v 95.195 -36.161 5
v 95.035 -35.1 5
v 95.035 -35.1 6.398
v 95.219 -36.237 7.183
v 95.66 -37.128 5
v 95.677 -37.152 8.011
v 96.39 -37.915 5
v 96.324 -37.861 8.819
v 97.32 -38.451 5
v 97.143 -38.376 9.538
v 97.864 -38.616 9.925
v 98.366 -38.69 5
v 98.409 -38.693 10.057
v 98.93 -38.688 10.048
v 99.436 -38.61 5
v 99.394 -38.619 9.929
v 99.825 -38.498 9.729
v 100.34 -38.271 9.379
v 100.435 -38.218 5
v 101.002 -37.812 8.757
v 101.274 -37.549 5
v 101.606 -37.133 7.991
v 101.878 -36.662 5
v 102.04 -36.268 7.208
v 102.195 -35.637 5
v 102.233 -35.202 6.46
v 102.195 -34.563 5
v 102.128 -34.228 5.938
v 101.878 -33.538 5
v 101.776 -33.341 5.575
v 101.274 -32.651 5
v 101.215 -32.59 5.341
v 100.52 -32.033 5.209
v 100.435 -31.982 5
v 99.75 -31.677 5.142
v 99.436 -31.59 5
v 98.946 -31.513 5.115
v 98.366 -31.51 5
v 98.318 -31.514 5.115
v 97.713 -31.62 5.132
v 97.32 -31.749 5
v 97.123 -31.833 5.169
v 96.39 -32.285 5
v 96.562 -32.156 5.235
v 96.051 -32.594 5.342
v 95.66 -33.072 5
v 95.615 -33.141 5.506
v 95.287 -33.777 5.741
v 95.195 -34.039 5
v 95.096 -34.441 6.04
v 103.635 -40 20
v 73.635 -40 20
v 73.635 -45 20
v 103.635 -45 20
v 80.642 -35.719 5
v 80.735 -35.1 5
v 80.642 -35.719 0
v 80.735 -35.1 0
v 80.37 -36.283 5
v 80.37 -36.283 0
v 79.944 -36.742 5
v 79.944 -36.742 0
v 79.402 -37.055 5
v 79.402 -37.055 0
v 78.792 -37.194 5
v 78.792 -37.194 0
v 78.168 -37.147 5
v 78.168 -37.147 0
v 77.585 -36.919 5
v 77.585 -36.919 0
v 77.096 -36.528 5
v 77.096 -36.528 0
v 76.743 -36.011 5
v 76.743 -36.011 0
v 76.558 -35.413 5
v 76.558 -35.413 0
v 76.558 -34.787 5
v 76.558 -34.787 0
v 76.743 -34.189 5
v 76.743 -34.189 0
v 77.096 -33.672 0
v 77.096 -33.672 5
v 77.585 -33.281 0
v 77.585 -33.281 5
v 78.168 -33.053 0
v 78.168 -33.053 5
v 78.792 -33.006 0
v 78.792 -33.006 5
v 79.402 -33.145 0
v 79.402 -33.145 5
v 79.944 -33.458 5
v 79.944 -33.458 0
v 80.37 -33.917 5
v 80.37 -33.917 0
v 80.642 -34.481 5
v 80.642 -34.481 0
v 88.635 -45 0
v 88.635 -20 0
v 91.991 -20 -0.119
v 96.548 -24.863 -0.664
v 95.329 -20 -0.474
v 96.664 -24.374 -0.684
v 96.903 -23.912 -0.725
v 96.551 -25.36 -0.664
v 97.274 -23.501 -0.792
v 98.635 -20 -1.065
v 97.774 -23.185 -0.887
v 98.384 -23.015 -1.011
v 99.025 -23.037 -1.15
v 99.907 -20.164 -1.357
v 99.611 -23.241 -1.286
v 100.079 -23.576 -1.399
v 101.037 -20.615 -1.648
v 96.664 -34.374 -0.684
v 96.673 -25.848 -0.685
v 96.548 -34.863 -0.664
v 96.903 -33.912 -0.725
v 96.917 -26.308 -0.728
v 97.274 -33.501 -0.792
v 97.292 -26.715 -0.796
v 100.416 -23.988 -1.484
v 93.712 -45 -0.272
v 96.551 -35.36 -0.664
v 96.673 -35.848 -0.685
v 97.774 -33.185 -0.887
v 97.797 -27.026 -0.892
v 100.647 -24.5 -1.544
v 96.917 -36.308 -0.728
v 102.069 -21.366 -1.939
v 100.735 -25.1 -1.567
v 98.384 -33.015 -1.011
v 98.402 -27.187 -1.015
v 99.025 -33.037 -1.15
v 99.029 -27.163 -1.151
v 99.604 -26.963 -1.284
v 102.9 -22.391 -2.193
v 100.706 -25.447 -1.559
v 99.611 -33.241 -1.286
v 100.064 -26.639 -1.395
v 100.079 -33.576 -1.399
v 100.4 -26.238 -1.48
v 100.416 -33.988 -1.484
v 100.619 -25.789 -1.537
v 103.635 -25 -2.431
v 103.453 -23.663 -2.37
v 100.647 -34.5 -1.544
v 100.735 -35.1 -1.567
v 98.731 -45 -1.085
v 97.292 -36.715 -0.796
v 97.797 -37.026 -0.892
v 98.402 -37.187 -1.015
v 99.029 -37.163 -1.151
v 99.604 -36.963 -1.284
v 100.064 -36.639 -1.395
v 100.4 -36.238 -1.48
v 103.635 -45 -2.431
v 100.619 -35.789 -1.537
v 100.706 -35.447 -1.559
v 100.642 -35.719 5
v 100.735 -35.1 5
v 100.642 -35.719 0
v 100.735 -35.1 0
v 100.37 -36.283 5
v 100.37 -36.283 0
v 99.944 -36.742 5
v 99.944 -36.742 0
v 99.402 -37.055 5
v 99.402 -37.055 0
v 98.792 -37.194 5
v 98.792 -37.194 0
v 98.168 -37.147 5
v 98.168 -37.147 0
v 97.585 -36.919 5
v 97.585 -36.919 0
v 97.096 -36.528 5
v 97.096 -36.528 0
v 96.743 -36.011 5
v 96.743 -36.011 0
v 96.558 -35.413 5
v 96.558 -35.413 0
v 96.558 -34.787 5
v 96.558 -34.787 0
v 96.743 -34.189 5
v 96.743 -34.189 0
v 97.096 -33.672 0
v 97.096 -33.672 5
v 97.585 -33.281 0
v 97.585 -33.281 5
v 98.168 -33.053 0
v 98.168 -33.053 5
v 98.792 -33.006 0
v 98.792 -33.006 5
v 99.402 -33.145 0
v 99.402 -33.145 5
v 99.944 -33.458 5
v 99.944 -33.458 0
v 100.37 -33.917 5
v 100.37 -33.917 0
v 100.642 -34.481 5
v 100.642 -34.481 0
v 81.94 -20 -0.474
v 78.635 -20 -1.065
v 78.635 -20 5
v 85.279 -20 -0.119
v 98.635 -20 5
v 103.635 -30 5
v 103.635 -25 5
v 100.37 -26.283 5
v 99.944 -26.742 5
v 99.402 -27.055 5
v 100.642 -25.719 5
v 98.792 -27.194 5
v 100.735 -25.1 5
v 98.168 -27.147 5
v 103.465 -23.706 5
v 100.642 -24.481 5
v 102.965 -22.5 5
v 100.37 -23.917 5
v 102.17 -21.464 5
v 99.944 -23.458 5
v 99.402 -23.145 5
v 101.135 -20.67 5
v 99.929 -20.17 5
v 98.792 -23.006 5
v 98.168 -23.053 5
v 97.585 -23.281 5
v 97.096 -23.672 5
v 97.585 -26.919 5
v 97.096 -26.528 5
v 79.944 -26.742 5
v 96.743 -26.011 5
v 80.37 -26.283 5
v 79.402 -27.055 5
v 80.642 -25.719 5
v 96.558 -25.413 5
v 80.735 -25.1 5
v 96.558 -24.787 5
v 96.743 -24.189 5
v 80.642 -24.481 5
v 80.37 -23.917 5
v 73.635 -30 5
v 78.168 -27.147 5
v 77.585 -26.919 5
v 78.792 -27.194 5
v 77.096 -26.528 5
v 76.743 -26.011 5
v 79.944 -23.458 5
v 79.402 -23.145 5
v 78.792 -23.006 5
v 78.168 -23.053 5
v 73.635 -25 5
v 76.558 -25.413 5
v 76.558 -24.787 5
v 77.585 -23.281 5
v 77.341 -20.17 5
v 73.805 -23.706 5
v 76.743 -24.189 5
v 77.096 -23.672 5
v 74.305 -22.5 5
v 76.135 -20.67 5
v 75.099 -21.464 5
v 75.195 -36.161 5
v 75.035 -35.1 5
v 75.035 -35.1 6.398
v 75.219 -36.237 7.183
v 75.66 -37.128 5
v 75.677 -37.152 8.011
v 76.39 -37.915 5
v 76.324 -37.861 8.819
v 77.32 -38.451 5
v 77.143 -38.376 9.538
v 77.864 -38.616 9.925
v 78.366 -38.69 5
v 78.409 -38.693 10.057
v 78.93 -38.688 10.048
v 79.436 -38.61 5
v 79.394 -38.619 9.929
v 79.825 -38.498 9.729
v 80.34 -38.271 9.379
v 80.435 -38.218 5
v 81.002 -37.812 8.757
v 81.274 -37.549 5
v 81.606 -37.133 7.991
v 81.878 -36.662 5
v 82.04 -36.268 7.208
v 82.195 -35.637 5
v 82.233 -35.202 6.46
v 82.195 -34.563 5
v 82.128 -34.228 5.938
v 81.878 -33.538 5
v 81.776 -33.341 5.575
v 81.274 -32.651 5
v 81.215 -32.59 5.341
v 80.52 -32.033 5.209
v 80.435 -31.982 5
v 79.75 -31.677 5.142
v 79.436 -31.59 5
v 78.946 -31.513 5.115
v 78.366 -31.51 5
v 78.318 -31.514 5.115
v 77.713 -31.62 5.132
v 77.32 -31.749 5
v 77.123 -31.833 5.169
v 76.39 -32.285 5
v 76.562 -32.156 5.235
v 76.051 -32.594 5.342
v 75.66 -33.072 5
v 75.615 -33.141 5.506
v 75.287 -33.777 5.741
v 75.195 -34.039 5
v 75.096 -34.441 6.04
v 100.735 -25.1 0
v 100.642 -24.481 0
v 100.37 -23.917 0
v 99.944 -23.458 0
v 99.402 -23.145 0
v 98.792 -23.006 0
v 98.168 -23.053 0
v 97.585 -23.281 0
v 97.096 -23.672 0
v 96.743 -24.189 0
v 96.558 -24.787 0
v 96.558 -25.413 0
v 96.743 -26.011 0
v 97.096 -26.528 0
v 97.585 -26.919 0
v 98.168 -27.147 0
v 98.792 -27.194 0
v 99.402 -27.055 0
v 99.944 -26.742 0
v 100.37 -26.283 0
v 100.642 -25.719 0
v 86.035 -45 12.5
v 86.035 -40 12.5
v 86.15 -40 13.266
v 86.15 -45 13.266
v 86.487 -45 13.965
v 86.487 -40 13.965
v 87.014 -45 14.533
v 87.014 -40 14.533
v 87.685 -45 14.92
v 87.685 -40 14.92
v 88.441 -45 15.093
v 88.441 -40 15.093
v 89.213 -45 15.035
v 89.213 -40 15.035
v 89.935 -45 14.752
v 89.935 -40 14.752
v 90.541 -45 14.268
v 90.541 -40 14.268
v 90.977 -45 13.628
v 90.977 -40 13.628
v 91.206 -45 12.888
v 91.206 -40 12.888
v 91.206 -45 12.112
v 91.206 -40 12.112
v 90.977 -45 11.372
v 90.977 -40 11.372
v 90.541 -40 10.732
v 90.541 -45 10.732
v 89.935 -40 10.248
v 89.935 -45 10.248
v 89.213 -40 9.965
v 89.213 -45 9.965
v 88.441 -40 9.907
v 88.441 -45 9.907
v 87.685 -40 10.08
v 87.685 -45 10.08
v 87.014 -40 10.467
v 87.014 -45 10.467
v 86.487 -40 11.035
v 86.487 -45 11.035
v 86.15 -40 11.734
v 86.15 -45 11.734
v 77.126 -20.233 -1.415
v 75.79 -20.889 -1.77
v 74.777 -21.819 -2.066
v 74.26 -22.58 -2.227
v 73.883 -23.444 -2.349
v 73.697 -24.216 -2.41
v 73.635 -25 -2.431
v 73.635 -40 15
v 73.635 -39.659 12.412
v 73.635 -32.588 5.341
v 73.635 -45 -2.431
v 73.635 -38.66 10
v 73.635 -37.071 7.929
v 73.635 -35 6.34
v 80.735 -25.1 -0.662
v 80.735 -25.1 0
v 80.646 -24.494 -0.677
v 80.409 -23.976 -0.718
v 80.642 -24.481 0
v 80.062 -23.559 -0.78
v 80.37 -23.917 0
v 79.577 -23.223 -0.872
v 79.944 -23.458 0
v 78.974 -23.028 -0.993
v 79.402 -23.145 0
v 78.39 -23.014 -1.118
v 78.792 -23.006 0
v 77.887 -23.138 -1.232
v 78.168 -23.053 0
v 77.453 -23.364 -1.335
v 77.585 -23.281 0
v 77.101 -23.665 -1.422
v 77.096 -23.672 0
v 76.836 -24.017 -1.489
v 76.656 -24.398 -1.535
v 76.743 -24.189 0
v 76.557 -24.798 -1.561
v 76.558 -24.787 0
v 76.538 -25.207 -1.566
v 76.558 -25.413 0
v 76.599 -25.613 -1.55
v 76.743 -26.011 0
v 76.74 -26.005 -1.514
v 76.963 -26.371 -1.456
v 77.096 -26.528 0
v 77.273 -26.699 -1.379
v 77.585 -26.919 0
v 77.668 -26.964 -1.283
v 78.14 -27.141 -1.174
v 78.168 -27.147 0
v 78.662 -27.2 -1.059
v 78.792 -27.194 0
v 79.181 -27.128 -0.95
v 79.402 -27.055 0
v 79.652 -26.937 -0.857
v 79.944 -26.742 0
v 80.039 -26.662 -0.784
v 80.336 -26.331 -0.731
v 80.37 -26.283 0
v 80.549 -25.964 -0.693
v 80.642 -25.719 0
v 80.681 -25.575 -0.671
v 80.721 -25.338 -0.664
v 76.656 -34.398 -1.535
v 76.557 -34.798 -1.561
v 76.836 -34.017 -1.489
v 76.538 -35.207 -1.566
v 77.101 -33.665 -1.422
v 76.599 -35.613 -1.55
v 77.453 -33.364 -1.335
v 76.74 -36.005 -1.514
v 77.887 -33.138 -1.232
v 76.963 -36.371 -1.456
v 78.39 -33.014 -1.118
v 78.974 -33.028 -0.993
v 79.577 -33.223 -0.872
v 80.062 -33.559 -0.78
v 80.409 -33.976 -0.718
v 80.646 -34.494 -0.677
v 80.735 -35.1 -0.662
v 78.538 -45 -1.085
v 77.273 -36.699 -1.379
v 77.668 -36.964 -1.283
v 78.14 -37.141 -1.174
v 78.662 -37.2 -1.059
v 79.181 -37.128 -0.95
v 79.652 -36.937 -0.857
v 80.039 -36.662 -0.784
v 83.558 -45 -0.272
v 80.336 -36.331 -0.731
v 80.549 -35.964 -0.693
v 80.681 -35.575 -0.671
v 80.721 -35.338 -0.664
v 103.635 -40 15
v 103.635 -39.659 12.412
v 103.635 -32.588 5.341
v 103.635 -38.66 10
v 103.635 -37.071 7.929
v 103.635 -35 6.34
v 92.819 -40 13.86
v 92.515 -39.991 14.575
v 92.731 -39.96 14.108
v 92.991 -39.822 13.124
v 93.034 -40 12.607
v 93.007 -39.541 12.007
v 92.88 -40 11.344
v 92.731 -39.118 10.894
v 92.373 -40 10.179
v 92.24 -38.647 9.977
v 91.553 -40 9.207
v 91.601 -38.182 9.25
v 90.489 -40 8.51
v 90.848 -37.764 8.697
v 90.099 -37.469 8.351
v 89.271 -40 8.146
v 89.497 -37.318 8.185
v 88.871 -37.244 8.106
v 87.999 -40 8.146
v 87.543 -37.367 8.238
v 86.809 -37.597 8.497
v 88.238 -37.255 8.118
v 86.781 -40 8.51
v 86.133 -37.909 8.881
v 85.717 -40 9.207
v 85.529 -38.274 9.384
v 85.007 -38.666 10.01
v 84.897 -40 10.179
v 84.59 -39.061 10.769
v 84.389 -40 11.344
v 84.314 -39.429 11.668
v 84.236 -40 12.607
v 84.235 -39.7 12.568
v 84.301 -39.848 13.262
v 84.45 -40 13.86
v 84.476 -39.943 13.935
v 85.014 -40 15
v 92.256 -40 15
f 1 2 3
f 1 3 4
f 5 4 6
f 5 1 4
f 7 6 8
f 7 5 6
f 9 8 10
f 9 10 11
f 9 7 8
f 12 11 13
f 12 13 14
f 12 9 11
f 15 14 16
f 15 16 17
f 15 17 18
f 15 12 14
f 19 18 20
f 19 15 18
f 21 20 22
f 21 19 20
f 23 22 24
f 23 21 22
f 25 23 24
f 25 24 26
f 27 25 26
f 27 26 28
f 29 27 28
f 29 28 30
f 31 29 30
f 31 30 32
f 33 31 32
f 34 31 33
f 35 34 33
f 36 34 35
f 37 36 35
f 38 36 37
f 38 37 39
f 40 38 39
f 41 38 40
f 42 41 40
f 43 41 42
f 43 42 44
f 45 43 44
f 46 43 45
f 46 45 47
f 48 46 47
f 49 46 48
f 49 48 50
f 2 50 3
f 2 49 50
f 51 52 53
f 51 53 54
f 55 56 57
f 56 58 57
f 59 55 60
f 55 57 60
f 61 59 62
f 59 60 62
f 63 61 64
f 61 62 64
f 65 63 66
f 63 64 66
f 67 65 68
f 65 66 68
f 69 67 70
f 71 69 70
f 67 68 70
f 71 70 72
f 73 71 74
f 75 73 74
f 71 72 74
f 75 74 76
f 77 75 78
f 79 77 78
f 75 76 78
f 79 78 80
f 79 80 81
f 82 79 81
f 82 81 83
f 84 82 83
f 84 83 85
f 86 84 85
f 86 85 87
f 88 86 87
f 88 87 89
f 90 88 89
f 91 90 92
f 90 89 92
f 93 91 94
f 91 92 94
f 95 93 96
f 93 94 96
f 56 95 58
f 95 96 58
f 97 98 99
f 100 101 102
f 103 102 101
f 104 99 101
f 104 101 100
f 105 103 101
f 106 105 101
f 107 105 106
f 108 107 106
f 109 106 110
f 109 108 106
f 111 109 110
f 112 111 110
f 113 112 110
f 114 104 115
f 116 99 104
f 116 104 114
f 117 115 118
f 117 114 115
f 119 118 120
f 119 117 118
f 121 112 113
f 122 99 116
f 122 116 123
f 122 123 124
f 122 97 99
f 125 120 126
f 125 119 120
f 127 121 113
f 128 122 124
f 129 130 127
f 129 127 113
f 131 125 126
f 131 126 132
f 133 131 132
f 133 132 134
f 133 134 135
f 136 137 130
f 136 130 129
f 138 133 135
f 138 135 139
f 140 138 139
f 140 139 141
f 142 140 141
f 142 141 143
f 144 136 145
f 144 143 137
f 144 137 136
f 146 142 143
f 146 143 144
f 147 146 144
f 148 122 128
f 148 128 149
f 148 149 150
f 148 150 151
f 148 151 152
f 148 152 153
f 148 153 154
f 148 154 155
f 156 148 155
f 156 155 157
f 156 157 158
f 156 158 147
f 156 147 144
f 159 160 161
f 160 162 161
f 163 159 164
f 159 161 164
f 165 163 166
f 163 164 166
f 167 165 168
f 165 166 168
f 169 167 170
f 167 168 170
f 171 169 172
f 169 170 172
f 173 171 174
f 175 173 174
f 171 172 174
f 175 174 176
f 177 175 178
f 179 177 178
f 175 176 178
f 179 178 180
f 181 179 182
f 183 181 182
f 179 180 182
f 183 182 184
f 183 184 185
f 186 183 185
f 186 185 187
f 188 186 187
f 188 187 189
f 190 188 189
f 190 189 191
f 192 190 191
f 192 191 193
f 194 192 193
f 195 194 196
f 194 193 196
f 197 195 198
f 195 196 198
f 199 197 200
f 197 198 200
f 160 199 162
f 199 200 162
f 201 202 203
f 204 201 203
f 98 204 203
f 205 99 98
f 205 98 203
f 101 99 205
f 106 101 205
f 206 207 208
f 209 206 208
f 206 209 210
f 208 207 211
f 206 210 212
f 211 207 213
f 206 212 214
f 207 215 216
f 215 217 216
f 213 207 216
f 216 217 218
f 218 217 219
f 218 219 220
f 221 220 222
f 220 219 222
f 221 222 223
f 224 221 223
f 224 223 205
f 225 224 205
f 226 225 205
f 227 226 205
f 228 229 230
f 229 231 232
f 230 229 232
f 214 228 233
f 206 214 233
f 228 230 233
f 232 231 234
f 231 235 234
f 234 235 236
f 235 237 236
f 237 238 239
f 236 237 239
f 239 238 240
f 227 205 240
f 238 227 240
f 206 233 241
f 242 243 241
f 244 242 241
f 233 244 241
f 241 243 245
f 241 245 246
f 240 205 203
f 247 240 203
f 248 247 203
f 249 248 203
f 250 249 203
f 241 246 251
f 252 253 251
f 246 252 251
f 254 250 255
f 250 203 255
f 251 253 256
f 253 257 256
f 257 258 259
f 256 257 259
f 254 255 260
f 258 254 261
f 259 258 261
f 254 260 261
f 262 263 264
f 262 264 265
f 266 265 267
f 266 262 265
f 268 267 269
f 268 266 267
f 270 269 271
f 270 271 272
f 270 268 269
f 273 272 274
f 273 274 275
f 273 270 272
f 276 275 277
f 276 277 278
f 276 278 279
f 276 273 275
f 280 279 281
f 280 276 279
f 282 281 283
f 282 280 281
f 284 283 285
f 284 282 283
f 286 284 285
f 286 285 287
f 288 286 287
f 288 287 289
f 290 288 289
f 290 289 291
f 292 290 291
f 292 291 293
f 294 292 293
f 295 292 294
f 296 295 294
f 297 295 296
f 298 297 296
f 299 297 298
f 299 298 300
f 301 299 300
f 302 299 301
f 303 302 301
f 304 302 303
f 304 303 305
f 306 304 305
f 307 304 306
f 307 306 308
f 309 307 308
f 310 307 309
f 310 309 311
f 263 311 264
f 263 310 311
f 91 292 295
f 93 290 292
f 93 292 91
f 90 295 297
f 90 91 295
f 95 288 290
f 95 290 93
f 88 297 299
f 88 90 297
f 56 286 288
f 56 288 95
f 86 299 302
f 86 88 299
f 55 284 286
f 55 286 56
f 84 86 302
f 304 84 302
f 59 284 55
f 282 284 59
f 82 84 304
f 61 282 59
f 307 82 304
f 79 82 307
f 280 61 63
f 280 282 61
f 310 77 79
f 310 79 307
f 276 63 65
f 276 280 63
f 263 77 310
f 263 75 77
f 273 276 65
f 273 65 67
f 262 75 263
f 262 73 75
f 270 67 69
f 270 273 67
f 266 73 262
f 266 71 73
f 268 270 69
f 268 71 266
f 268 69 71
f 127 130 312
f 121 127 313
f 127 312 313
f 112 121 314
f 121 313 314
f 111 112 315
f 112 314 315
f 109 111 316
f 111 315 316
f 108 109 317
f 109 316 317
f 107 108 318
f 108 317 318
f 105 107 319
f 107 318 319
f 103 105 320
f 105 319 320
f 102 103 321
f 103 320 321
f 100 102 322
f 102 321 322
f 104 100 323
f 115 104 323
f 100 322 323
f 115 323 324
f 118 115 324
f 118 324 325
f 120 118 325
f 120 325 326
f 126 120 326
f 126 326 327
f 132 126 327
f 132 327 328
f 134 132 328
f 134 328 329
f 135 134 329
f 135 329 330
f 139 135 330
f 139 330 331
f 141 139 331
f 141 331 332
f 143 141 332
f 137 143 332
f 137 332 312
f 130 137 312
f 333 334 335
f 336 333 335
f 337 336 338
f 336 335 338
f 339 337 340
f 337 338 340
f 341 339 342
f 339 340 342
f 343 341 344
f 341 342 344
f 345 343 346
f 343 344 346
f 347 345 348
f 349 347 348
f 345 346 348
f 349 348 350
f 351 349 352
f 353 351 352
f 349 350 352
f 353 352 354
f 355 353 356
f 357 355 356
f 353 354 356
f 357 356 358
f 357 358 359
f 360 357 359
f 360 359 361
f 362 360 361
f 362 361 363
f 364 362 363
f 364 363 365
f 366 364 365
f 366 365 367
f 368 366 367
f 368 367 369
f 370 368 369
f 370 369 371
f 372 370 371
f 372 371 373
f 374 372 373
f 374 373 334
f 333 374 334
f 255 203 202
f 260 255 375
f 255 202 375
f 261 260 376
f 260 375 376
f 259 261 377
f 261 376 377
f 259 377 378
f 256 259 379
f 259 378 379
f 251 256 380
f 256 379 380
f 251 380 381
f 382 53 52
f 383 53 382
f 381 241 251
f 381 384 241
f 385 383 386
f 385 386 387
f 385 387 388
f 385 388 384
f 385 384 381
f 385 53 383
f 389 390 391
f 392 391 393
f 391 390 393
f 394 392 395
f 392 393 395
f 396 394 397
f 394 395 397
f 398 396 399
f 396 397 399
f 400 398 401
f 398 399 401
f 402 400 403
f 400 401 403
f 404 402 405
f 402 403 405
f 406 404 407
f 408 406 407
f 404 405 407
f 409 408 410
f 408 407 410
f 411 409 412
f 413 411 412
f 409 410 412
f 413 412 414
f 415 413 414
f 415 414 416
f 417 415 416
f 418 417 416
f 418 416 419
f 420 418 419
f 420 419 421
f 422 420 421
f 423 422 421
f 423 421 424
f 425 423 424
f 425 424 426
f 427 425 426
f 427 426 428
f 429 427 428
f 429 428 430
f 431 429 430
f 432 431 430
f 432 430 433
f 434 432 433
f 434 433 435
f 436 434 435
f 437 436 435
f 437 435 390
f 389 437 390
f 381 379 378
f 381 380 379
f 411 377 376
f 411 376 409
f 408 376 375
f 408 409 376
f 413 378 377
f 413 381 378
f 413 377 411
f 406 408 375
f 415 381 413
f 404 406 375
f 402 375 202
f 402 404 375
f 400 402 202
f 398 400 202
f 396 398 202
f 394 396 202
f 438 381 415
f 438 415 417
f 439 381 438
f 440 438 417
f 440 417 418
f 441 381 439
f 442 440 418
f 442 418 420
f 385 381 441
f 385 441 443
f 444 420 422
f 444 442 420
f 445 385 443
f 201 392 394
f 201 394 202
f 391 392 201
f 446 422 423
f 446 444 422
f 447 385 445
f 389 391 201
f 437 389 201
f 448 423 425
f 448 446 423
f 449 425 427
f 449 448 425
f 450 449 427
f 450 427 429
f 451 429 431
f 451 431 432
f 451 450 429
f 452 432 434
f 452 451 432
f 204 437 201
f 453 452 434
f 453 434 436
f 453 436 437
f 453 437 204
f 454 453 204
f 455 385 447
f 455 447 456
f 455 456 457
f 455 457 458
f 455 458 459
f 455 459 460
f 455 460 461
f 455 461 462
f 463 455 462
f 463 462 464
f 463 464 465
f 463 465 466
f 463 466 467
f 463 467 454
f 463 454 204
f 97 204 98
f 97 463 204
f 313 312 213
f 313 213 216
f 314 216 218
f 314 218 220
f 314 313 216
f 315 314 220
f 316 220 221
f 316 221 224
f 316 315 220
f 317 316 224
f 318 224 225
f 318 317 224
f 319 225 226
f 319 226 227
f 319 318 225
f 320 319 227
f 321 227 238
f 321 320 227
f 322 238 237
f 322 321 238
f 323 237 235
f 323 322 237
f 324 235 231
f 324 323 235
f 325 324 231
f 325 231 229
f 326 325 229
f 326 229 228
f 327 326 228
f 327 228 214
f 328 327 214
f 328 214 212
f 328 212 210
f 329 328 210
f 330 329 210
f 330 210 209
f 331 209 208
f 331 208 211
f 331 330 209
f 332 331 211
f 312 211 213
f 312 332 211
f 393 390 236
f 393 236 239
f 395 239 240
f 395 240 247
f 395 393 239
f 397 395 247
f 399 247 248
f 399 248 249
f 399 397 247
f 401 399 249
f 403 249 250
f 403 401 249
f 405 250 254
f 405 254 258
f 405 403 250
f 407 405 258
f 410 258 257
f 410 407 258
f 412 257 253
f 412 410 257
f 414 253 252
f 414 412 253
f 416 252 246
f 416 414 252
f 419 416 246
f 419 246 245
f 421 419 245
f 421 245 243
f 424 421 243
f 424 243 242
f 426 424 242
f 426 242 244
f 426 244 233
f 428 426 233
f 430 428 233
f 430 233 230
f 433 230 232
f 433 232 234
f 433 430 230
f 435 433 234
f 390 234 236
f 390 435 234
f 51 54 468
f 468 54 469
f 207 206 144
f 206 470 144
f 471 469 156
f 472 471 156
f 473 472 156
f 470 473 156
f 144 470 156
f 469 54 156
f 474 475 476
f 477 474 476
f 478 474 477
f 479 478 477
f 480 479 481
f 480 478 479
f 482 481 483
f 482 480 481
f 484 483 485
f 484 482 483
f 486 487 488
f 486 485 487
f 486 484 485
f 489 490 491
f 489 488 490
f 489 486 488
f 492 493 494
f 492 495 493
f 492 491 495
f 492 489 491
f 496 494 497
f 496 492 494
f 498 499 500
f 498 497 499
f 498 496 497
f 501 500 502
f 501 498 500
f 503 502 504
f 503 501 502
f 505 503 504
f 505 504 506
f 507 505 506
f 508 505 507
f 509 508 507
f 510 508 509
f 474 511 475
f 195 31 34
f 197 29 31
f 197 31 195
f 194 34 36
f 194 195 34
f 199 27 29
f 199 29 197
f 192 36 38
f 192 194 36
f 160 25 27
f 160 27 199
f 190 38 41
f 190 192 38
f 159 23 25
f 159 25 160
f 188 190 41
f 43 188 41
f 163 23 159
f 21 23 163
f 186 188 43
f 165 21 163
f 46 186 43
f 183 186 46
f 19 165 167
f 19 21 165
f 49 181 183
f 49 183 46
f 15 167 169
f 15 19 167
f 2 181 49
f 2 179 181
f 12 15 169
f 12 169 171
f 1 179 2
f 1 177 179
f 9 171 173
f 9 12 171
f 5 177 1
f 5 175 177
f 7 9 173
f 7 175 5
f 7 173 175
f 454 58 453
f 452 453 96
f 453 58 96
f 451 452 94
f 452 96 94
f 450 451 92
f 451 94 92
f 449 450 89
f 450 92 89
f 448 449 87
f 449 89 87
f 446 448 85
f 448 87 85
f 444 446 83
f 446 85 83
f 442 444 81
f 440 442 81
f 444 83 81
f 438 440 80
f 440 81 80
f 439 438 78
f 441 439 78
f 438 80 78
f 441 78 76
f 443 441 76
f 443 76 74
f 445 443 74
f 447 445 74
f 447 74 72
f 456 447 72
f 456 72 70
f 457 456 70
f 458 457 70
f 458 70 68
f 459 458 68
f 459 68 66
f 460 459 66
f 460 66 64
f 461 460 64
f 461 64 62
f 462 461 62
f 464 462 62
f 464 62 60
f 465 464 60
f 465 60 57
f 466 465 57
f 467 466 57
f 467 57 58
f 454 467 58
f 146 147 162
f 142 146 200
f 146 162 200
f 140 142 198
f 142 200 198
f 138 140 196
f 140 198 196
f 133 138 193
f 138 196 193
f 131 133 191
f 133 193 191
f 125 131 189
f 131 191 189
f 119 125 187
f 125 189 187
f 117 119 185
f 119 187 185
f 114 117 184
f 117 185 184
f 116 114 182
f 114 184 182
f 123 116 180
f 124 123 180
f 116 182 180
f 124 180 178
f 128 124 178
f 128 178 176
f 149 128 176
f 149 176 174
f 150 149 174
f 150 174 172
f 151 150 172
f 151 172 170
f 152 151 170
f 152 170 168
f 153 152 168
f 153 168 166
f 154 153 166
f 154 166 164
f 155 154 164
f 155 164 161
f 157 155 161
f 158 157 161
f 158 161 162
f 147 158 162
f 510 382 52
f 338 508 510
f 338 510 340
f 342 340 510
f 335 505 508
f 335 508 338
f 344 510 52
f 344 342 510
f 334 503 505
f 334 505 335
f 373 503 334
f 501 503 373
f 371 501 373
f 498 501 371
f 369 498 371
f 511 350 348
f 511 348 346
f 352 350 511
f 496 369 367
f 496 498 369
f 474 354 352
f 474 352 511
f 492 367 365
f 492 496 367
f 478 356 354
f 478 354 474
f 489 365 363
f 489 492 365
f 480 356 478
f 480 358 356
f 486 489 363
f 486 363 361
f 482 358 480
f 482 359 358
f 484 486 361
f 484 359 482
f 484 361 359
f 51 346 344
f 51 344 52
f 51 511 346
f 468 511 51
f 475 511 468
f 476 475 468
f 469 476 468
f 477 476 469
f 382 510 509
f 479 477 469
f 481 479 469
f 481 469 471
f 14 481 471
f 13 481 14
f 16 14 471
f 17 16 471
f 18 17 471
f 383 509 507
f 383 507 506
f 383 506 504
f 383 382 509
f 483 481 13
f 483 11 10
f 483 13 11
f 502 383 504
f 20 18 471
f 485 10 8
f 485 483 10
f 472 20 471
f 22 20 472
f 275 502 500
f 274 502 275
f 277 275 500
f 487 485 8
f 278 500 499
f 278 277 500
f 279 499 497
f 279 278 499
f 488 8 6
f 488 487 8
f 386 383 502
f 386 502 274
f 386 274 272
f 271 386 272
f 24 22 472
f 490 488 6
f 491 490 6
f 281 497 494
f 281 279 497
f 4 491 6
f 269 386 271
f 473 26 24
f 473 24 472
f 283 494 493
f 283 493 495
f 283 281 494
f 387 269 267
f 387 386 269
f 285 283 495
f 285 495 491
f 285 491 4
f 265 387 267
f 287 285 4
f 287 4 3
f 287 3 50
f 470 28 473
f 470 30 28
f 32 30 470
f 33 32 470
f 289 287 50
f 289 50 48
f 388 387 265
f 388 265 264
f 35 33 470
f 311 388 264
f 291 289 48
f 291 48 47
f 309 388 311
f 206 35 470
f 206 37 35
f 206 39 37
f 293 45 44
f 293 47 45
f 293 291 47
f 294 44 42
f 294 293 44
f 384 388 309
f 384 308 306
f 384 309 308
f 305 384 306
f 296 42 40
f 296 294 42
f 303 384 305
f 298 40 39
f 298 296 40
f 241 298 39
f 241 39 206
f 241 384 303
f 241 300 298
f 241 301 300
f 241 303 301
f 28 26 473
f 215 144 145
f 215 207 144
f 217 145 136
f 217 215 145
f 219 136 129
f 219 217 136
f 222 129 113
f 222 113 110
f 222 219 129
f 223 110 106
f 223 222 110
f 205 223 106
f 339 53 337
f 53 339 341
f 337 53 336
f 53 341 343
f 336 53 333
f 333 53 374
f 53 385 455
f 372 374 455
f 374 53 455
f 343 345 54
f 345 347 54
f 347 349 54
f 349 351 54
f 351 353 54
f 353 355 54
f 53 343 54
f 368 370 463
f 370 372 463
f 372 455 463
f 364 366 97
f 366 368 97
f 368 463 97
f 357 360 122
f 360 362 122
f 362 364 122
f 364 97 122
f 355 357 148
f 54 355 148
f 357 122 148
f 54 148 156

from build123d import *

# Parameters (mm, degrees)
SKETCH1_R           = 2.1
BOSS_EXTRUDE1_DEPTH = 5
SKETCH3_W           = 30
SKETCH3_H           = 5
BOSS_EXTRUDE2_DEPTH = 15
SKETCH4_R           = 2.6
CUT_EXTRUDE2_DEPTH  = 108.425323176
FILLET2_R           = 10
SKETCH5_R           = 4.4
CUT_EXTRUDE3_DEPTH  = 108.425323272
SKETCH2_R           = 3.6
CUT_EXTRUDE4_DEPTH  = 114.974558916
BOSS_EXTRUDE3_DEPTH = 25
FILLET3_R           = 5
SKETCH7_R           = 2.1
CUT_EXTRUDE5_DEPTH  = 114.974558956


with BuildPart() as part:
    # Sketch1 → Boss-Extrude1 (new body)
    with BuildSketch(Plane.XY):
        Polygon((73.634936481, -21), (73.634936481, -20), (103.634936481, -20), (103.634936481, -21), (103.634936481, -45), (73.634936481, -45), align=None)
        with Locations((98.634936481, -35.1)):
            Circle(SKETCH1_R, mode=Mode.SUBTRACT)
        with Locations((78.634936481, -35.1)):
            Circle(SKETCH1_R, mode=Mode.SUBTRACT)
        with Locations((98.634936481, -25.1)):
            Circle(SKETCH1_R, mode=Mode.SUBTRACT)
        with Locations((78.634936481, -25.1)):
            Circle(SKETCH1_R, mode=Mode.SUBTRACT)
    extrude(amount=BOSS_EXTRUDE1_DEPTH)

    # Sketch3 → Boss-Extrude2 (add)
    with BuildSketch(Plane.XY.offset(5)):
        with Locations((88.634936481, -42.5)):
            Rectangle(SKETCH3_W, SKETCH3_H)
    extrude(amount=BOSS_EXTRUDE2_DEPTH)

    # Sketch4 → Cut-Extrude2 (cut, through all)
    with BuildSketch(Plane(origin=(0, -40, 0), x_dir=(1, 0, 0), z_dir=(0, 1, 0))):
        with Locations(Location((88.634936481, -12.5, 0), (0, 0, 180))):
            Circle(SKETCH4_R)
    extrude(amount=-CUT_EXTRUDE2_DEPTH, mode=Mode.SUBTRACT)

    # Fillet2
    # the kernel refuses this fillet: 10 mm, written as the material it adds along each edge
    with BuildSketch(Plane(origin=(73.634936481, -40, 5), x_dir=(0, 0, 1), z_dir=(1, 0, 0))) as fillet2_piece_1_section:
        with BuildLine():
            CenterArc((FILLET2_R, -FILLET2_R), FILLET2_R, 90, 90)
            Line((0, -FILLET2_R), (0, 0))
            Line((0, 0), (FILLET2_R, 0))
        make_face()
    fillet2_piece_1 = extrude(amount=30, mode=Mode.PRIVATE)
    fillet2_piece_1 = fillet2_piece_1 - Plane(origin=(88.634936481, -37.846712749, 12.5), x_dir=(-1, 0, 0), z_dir=(0, 1, 0)) * Cylinder(2.6, 100, mode=Mode.PRIVATE)
    fillet2_piece_1 = fillet2_piece_1 - Plane(origin=(98.634936481, -35.1, 7.280393082), x_dir=(1, 0, 0), z_dir=(0, 0, -1)) * Cylinder(2.1, 100, mode=Mode.PRIVATE)
    fillet2_piece_1 = fillet2_piece_1 - Plane(origin=(78.634936481, -35.1, 7.280393082), x_dir=(1, 0, 0), z_dir=(0, 0, -1)) * Cylinder(2.1, 100, mode=Mode.PRIVATE)
    add(fillet2_piece_1)

    # Sketch5 → Cut-Extrude3 (cut, through all)
    with BuildSketch(Plane(origin=(0, -40, 0), x_dir=(1, 0, 0), z_dir=(0, 1, 0))):
        with Locations((88.634936481, -12.5)):
            Circle(SKETCH5_R)
    extrude(amount=CUT_EXTRUDE3_DEPTH, mode=Mode.SUBTRACT)

    # Sketch2 → Cut-Extrude4 (cut, through all)
    with BuildSketch(Plane.XY.offset(5)):
        with Locations((98.634936481, -25.1)):
            Circle(SKETCH2_R)
        with Locations(Location((98.634936481, -35.1, 0), (0, 0, 180))):
            Circle(SKETCH2_R)
        with Locations((78.634936481, -25.1)):
            Circle(SKETCH2_R)
        with Locations(Location((78.634936481, -35.1, 0), (0, 0, 180))):
            Circle(SKETCH2_R)
    extrude(amount=CUT_EXTRUDE4_DEPTH, mode=Mode.SUBTRACT)

    # Sketch6 → Boss-Extrude3 (add)
    with BuildSketch(Plane.XZ.offset(45)):
        with BuildLine():
            Line((88.634936481, 0), (73.634936481, 0))
            Line((73.634936481, 0), (73.634936481, -2.430609057))
            ThreePointArc((73.634936481, -2.430609057), (81.037110141, -0.611589546), (88.634936481, 0))
        make_face()
        with BuildLine():
            Line((103.634936481, 0), (88.634936481, 0))
            ThreePointArc((88.634936481, 0), (96.232762821, -0.611589546), (103.634936481, -2.430609057))
            Line((103.634936481, -2.430609057), (103.634936481, 0))
        make_face()
    extrude(amount=-BOSS_EXTRUDE3_DEPTH)

    # Fillet3
    fillet3_edges = [part.edges().sort_by_distance(p)[0] for p in [
        (103.634936481, -20, 1.284695471),
        (73.634936481, -20, 1.284695471),
    ]]
    fillet(fillet3_edges, radius=FILLET3_R)

    # Sketch7 → Cut-Extrude5 (cut, through all)
    with BuildSketch(Plane.XY.offset(5)):
        with Locations((98.634936481, -35.1)):
            Circle(SKETCH7_R)
        with Locations((98.634936481, -25.1)):
            Circle(SKETCH7_R)
        with Locations((78.634936481, -25.1)):
            Circle(SKETCH7_R)
        with Locations((78.634936481, -35.1)):
            Circle(SKETCH7_R)
    extrude(amount=-CUT_EXTRUDE5_DEPTH, mode=Mode.SUBTRACT)


solid = part.part
